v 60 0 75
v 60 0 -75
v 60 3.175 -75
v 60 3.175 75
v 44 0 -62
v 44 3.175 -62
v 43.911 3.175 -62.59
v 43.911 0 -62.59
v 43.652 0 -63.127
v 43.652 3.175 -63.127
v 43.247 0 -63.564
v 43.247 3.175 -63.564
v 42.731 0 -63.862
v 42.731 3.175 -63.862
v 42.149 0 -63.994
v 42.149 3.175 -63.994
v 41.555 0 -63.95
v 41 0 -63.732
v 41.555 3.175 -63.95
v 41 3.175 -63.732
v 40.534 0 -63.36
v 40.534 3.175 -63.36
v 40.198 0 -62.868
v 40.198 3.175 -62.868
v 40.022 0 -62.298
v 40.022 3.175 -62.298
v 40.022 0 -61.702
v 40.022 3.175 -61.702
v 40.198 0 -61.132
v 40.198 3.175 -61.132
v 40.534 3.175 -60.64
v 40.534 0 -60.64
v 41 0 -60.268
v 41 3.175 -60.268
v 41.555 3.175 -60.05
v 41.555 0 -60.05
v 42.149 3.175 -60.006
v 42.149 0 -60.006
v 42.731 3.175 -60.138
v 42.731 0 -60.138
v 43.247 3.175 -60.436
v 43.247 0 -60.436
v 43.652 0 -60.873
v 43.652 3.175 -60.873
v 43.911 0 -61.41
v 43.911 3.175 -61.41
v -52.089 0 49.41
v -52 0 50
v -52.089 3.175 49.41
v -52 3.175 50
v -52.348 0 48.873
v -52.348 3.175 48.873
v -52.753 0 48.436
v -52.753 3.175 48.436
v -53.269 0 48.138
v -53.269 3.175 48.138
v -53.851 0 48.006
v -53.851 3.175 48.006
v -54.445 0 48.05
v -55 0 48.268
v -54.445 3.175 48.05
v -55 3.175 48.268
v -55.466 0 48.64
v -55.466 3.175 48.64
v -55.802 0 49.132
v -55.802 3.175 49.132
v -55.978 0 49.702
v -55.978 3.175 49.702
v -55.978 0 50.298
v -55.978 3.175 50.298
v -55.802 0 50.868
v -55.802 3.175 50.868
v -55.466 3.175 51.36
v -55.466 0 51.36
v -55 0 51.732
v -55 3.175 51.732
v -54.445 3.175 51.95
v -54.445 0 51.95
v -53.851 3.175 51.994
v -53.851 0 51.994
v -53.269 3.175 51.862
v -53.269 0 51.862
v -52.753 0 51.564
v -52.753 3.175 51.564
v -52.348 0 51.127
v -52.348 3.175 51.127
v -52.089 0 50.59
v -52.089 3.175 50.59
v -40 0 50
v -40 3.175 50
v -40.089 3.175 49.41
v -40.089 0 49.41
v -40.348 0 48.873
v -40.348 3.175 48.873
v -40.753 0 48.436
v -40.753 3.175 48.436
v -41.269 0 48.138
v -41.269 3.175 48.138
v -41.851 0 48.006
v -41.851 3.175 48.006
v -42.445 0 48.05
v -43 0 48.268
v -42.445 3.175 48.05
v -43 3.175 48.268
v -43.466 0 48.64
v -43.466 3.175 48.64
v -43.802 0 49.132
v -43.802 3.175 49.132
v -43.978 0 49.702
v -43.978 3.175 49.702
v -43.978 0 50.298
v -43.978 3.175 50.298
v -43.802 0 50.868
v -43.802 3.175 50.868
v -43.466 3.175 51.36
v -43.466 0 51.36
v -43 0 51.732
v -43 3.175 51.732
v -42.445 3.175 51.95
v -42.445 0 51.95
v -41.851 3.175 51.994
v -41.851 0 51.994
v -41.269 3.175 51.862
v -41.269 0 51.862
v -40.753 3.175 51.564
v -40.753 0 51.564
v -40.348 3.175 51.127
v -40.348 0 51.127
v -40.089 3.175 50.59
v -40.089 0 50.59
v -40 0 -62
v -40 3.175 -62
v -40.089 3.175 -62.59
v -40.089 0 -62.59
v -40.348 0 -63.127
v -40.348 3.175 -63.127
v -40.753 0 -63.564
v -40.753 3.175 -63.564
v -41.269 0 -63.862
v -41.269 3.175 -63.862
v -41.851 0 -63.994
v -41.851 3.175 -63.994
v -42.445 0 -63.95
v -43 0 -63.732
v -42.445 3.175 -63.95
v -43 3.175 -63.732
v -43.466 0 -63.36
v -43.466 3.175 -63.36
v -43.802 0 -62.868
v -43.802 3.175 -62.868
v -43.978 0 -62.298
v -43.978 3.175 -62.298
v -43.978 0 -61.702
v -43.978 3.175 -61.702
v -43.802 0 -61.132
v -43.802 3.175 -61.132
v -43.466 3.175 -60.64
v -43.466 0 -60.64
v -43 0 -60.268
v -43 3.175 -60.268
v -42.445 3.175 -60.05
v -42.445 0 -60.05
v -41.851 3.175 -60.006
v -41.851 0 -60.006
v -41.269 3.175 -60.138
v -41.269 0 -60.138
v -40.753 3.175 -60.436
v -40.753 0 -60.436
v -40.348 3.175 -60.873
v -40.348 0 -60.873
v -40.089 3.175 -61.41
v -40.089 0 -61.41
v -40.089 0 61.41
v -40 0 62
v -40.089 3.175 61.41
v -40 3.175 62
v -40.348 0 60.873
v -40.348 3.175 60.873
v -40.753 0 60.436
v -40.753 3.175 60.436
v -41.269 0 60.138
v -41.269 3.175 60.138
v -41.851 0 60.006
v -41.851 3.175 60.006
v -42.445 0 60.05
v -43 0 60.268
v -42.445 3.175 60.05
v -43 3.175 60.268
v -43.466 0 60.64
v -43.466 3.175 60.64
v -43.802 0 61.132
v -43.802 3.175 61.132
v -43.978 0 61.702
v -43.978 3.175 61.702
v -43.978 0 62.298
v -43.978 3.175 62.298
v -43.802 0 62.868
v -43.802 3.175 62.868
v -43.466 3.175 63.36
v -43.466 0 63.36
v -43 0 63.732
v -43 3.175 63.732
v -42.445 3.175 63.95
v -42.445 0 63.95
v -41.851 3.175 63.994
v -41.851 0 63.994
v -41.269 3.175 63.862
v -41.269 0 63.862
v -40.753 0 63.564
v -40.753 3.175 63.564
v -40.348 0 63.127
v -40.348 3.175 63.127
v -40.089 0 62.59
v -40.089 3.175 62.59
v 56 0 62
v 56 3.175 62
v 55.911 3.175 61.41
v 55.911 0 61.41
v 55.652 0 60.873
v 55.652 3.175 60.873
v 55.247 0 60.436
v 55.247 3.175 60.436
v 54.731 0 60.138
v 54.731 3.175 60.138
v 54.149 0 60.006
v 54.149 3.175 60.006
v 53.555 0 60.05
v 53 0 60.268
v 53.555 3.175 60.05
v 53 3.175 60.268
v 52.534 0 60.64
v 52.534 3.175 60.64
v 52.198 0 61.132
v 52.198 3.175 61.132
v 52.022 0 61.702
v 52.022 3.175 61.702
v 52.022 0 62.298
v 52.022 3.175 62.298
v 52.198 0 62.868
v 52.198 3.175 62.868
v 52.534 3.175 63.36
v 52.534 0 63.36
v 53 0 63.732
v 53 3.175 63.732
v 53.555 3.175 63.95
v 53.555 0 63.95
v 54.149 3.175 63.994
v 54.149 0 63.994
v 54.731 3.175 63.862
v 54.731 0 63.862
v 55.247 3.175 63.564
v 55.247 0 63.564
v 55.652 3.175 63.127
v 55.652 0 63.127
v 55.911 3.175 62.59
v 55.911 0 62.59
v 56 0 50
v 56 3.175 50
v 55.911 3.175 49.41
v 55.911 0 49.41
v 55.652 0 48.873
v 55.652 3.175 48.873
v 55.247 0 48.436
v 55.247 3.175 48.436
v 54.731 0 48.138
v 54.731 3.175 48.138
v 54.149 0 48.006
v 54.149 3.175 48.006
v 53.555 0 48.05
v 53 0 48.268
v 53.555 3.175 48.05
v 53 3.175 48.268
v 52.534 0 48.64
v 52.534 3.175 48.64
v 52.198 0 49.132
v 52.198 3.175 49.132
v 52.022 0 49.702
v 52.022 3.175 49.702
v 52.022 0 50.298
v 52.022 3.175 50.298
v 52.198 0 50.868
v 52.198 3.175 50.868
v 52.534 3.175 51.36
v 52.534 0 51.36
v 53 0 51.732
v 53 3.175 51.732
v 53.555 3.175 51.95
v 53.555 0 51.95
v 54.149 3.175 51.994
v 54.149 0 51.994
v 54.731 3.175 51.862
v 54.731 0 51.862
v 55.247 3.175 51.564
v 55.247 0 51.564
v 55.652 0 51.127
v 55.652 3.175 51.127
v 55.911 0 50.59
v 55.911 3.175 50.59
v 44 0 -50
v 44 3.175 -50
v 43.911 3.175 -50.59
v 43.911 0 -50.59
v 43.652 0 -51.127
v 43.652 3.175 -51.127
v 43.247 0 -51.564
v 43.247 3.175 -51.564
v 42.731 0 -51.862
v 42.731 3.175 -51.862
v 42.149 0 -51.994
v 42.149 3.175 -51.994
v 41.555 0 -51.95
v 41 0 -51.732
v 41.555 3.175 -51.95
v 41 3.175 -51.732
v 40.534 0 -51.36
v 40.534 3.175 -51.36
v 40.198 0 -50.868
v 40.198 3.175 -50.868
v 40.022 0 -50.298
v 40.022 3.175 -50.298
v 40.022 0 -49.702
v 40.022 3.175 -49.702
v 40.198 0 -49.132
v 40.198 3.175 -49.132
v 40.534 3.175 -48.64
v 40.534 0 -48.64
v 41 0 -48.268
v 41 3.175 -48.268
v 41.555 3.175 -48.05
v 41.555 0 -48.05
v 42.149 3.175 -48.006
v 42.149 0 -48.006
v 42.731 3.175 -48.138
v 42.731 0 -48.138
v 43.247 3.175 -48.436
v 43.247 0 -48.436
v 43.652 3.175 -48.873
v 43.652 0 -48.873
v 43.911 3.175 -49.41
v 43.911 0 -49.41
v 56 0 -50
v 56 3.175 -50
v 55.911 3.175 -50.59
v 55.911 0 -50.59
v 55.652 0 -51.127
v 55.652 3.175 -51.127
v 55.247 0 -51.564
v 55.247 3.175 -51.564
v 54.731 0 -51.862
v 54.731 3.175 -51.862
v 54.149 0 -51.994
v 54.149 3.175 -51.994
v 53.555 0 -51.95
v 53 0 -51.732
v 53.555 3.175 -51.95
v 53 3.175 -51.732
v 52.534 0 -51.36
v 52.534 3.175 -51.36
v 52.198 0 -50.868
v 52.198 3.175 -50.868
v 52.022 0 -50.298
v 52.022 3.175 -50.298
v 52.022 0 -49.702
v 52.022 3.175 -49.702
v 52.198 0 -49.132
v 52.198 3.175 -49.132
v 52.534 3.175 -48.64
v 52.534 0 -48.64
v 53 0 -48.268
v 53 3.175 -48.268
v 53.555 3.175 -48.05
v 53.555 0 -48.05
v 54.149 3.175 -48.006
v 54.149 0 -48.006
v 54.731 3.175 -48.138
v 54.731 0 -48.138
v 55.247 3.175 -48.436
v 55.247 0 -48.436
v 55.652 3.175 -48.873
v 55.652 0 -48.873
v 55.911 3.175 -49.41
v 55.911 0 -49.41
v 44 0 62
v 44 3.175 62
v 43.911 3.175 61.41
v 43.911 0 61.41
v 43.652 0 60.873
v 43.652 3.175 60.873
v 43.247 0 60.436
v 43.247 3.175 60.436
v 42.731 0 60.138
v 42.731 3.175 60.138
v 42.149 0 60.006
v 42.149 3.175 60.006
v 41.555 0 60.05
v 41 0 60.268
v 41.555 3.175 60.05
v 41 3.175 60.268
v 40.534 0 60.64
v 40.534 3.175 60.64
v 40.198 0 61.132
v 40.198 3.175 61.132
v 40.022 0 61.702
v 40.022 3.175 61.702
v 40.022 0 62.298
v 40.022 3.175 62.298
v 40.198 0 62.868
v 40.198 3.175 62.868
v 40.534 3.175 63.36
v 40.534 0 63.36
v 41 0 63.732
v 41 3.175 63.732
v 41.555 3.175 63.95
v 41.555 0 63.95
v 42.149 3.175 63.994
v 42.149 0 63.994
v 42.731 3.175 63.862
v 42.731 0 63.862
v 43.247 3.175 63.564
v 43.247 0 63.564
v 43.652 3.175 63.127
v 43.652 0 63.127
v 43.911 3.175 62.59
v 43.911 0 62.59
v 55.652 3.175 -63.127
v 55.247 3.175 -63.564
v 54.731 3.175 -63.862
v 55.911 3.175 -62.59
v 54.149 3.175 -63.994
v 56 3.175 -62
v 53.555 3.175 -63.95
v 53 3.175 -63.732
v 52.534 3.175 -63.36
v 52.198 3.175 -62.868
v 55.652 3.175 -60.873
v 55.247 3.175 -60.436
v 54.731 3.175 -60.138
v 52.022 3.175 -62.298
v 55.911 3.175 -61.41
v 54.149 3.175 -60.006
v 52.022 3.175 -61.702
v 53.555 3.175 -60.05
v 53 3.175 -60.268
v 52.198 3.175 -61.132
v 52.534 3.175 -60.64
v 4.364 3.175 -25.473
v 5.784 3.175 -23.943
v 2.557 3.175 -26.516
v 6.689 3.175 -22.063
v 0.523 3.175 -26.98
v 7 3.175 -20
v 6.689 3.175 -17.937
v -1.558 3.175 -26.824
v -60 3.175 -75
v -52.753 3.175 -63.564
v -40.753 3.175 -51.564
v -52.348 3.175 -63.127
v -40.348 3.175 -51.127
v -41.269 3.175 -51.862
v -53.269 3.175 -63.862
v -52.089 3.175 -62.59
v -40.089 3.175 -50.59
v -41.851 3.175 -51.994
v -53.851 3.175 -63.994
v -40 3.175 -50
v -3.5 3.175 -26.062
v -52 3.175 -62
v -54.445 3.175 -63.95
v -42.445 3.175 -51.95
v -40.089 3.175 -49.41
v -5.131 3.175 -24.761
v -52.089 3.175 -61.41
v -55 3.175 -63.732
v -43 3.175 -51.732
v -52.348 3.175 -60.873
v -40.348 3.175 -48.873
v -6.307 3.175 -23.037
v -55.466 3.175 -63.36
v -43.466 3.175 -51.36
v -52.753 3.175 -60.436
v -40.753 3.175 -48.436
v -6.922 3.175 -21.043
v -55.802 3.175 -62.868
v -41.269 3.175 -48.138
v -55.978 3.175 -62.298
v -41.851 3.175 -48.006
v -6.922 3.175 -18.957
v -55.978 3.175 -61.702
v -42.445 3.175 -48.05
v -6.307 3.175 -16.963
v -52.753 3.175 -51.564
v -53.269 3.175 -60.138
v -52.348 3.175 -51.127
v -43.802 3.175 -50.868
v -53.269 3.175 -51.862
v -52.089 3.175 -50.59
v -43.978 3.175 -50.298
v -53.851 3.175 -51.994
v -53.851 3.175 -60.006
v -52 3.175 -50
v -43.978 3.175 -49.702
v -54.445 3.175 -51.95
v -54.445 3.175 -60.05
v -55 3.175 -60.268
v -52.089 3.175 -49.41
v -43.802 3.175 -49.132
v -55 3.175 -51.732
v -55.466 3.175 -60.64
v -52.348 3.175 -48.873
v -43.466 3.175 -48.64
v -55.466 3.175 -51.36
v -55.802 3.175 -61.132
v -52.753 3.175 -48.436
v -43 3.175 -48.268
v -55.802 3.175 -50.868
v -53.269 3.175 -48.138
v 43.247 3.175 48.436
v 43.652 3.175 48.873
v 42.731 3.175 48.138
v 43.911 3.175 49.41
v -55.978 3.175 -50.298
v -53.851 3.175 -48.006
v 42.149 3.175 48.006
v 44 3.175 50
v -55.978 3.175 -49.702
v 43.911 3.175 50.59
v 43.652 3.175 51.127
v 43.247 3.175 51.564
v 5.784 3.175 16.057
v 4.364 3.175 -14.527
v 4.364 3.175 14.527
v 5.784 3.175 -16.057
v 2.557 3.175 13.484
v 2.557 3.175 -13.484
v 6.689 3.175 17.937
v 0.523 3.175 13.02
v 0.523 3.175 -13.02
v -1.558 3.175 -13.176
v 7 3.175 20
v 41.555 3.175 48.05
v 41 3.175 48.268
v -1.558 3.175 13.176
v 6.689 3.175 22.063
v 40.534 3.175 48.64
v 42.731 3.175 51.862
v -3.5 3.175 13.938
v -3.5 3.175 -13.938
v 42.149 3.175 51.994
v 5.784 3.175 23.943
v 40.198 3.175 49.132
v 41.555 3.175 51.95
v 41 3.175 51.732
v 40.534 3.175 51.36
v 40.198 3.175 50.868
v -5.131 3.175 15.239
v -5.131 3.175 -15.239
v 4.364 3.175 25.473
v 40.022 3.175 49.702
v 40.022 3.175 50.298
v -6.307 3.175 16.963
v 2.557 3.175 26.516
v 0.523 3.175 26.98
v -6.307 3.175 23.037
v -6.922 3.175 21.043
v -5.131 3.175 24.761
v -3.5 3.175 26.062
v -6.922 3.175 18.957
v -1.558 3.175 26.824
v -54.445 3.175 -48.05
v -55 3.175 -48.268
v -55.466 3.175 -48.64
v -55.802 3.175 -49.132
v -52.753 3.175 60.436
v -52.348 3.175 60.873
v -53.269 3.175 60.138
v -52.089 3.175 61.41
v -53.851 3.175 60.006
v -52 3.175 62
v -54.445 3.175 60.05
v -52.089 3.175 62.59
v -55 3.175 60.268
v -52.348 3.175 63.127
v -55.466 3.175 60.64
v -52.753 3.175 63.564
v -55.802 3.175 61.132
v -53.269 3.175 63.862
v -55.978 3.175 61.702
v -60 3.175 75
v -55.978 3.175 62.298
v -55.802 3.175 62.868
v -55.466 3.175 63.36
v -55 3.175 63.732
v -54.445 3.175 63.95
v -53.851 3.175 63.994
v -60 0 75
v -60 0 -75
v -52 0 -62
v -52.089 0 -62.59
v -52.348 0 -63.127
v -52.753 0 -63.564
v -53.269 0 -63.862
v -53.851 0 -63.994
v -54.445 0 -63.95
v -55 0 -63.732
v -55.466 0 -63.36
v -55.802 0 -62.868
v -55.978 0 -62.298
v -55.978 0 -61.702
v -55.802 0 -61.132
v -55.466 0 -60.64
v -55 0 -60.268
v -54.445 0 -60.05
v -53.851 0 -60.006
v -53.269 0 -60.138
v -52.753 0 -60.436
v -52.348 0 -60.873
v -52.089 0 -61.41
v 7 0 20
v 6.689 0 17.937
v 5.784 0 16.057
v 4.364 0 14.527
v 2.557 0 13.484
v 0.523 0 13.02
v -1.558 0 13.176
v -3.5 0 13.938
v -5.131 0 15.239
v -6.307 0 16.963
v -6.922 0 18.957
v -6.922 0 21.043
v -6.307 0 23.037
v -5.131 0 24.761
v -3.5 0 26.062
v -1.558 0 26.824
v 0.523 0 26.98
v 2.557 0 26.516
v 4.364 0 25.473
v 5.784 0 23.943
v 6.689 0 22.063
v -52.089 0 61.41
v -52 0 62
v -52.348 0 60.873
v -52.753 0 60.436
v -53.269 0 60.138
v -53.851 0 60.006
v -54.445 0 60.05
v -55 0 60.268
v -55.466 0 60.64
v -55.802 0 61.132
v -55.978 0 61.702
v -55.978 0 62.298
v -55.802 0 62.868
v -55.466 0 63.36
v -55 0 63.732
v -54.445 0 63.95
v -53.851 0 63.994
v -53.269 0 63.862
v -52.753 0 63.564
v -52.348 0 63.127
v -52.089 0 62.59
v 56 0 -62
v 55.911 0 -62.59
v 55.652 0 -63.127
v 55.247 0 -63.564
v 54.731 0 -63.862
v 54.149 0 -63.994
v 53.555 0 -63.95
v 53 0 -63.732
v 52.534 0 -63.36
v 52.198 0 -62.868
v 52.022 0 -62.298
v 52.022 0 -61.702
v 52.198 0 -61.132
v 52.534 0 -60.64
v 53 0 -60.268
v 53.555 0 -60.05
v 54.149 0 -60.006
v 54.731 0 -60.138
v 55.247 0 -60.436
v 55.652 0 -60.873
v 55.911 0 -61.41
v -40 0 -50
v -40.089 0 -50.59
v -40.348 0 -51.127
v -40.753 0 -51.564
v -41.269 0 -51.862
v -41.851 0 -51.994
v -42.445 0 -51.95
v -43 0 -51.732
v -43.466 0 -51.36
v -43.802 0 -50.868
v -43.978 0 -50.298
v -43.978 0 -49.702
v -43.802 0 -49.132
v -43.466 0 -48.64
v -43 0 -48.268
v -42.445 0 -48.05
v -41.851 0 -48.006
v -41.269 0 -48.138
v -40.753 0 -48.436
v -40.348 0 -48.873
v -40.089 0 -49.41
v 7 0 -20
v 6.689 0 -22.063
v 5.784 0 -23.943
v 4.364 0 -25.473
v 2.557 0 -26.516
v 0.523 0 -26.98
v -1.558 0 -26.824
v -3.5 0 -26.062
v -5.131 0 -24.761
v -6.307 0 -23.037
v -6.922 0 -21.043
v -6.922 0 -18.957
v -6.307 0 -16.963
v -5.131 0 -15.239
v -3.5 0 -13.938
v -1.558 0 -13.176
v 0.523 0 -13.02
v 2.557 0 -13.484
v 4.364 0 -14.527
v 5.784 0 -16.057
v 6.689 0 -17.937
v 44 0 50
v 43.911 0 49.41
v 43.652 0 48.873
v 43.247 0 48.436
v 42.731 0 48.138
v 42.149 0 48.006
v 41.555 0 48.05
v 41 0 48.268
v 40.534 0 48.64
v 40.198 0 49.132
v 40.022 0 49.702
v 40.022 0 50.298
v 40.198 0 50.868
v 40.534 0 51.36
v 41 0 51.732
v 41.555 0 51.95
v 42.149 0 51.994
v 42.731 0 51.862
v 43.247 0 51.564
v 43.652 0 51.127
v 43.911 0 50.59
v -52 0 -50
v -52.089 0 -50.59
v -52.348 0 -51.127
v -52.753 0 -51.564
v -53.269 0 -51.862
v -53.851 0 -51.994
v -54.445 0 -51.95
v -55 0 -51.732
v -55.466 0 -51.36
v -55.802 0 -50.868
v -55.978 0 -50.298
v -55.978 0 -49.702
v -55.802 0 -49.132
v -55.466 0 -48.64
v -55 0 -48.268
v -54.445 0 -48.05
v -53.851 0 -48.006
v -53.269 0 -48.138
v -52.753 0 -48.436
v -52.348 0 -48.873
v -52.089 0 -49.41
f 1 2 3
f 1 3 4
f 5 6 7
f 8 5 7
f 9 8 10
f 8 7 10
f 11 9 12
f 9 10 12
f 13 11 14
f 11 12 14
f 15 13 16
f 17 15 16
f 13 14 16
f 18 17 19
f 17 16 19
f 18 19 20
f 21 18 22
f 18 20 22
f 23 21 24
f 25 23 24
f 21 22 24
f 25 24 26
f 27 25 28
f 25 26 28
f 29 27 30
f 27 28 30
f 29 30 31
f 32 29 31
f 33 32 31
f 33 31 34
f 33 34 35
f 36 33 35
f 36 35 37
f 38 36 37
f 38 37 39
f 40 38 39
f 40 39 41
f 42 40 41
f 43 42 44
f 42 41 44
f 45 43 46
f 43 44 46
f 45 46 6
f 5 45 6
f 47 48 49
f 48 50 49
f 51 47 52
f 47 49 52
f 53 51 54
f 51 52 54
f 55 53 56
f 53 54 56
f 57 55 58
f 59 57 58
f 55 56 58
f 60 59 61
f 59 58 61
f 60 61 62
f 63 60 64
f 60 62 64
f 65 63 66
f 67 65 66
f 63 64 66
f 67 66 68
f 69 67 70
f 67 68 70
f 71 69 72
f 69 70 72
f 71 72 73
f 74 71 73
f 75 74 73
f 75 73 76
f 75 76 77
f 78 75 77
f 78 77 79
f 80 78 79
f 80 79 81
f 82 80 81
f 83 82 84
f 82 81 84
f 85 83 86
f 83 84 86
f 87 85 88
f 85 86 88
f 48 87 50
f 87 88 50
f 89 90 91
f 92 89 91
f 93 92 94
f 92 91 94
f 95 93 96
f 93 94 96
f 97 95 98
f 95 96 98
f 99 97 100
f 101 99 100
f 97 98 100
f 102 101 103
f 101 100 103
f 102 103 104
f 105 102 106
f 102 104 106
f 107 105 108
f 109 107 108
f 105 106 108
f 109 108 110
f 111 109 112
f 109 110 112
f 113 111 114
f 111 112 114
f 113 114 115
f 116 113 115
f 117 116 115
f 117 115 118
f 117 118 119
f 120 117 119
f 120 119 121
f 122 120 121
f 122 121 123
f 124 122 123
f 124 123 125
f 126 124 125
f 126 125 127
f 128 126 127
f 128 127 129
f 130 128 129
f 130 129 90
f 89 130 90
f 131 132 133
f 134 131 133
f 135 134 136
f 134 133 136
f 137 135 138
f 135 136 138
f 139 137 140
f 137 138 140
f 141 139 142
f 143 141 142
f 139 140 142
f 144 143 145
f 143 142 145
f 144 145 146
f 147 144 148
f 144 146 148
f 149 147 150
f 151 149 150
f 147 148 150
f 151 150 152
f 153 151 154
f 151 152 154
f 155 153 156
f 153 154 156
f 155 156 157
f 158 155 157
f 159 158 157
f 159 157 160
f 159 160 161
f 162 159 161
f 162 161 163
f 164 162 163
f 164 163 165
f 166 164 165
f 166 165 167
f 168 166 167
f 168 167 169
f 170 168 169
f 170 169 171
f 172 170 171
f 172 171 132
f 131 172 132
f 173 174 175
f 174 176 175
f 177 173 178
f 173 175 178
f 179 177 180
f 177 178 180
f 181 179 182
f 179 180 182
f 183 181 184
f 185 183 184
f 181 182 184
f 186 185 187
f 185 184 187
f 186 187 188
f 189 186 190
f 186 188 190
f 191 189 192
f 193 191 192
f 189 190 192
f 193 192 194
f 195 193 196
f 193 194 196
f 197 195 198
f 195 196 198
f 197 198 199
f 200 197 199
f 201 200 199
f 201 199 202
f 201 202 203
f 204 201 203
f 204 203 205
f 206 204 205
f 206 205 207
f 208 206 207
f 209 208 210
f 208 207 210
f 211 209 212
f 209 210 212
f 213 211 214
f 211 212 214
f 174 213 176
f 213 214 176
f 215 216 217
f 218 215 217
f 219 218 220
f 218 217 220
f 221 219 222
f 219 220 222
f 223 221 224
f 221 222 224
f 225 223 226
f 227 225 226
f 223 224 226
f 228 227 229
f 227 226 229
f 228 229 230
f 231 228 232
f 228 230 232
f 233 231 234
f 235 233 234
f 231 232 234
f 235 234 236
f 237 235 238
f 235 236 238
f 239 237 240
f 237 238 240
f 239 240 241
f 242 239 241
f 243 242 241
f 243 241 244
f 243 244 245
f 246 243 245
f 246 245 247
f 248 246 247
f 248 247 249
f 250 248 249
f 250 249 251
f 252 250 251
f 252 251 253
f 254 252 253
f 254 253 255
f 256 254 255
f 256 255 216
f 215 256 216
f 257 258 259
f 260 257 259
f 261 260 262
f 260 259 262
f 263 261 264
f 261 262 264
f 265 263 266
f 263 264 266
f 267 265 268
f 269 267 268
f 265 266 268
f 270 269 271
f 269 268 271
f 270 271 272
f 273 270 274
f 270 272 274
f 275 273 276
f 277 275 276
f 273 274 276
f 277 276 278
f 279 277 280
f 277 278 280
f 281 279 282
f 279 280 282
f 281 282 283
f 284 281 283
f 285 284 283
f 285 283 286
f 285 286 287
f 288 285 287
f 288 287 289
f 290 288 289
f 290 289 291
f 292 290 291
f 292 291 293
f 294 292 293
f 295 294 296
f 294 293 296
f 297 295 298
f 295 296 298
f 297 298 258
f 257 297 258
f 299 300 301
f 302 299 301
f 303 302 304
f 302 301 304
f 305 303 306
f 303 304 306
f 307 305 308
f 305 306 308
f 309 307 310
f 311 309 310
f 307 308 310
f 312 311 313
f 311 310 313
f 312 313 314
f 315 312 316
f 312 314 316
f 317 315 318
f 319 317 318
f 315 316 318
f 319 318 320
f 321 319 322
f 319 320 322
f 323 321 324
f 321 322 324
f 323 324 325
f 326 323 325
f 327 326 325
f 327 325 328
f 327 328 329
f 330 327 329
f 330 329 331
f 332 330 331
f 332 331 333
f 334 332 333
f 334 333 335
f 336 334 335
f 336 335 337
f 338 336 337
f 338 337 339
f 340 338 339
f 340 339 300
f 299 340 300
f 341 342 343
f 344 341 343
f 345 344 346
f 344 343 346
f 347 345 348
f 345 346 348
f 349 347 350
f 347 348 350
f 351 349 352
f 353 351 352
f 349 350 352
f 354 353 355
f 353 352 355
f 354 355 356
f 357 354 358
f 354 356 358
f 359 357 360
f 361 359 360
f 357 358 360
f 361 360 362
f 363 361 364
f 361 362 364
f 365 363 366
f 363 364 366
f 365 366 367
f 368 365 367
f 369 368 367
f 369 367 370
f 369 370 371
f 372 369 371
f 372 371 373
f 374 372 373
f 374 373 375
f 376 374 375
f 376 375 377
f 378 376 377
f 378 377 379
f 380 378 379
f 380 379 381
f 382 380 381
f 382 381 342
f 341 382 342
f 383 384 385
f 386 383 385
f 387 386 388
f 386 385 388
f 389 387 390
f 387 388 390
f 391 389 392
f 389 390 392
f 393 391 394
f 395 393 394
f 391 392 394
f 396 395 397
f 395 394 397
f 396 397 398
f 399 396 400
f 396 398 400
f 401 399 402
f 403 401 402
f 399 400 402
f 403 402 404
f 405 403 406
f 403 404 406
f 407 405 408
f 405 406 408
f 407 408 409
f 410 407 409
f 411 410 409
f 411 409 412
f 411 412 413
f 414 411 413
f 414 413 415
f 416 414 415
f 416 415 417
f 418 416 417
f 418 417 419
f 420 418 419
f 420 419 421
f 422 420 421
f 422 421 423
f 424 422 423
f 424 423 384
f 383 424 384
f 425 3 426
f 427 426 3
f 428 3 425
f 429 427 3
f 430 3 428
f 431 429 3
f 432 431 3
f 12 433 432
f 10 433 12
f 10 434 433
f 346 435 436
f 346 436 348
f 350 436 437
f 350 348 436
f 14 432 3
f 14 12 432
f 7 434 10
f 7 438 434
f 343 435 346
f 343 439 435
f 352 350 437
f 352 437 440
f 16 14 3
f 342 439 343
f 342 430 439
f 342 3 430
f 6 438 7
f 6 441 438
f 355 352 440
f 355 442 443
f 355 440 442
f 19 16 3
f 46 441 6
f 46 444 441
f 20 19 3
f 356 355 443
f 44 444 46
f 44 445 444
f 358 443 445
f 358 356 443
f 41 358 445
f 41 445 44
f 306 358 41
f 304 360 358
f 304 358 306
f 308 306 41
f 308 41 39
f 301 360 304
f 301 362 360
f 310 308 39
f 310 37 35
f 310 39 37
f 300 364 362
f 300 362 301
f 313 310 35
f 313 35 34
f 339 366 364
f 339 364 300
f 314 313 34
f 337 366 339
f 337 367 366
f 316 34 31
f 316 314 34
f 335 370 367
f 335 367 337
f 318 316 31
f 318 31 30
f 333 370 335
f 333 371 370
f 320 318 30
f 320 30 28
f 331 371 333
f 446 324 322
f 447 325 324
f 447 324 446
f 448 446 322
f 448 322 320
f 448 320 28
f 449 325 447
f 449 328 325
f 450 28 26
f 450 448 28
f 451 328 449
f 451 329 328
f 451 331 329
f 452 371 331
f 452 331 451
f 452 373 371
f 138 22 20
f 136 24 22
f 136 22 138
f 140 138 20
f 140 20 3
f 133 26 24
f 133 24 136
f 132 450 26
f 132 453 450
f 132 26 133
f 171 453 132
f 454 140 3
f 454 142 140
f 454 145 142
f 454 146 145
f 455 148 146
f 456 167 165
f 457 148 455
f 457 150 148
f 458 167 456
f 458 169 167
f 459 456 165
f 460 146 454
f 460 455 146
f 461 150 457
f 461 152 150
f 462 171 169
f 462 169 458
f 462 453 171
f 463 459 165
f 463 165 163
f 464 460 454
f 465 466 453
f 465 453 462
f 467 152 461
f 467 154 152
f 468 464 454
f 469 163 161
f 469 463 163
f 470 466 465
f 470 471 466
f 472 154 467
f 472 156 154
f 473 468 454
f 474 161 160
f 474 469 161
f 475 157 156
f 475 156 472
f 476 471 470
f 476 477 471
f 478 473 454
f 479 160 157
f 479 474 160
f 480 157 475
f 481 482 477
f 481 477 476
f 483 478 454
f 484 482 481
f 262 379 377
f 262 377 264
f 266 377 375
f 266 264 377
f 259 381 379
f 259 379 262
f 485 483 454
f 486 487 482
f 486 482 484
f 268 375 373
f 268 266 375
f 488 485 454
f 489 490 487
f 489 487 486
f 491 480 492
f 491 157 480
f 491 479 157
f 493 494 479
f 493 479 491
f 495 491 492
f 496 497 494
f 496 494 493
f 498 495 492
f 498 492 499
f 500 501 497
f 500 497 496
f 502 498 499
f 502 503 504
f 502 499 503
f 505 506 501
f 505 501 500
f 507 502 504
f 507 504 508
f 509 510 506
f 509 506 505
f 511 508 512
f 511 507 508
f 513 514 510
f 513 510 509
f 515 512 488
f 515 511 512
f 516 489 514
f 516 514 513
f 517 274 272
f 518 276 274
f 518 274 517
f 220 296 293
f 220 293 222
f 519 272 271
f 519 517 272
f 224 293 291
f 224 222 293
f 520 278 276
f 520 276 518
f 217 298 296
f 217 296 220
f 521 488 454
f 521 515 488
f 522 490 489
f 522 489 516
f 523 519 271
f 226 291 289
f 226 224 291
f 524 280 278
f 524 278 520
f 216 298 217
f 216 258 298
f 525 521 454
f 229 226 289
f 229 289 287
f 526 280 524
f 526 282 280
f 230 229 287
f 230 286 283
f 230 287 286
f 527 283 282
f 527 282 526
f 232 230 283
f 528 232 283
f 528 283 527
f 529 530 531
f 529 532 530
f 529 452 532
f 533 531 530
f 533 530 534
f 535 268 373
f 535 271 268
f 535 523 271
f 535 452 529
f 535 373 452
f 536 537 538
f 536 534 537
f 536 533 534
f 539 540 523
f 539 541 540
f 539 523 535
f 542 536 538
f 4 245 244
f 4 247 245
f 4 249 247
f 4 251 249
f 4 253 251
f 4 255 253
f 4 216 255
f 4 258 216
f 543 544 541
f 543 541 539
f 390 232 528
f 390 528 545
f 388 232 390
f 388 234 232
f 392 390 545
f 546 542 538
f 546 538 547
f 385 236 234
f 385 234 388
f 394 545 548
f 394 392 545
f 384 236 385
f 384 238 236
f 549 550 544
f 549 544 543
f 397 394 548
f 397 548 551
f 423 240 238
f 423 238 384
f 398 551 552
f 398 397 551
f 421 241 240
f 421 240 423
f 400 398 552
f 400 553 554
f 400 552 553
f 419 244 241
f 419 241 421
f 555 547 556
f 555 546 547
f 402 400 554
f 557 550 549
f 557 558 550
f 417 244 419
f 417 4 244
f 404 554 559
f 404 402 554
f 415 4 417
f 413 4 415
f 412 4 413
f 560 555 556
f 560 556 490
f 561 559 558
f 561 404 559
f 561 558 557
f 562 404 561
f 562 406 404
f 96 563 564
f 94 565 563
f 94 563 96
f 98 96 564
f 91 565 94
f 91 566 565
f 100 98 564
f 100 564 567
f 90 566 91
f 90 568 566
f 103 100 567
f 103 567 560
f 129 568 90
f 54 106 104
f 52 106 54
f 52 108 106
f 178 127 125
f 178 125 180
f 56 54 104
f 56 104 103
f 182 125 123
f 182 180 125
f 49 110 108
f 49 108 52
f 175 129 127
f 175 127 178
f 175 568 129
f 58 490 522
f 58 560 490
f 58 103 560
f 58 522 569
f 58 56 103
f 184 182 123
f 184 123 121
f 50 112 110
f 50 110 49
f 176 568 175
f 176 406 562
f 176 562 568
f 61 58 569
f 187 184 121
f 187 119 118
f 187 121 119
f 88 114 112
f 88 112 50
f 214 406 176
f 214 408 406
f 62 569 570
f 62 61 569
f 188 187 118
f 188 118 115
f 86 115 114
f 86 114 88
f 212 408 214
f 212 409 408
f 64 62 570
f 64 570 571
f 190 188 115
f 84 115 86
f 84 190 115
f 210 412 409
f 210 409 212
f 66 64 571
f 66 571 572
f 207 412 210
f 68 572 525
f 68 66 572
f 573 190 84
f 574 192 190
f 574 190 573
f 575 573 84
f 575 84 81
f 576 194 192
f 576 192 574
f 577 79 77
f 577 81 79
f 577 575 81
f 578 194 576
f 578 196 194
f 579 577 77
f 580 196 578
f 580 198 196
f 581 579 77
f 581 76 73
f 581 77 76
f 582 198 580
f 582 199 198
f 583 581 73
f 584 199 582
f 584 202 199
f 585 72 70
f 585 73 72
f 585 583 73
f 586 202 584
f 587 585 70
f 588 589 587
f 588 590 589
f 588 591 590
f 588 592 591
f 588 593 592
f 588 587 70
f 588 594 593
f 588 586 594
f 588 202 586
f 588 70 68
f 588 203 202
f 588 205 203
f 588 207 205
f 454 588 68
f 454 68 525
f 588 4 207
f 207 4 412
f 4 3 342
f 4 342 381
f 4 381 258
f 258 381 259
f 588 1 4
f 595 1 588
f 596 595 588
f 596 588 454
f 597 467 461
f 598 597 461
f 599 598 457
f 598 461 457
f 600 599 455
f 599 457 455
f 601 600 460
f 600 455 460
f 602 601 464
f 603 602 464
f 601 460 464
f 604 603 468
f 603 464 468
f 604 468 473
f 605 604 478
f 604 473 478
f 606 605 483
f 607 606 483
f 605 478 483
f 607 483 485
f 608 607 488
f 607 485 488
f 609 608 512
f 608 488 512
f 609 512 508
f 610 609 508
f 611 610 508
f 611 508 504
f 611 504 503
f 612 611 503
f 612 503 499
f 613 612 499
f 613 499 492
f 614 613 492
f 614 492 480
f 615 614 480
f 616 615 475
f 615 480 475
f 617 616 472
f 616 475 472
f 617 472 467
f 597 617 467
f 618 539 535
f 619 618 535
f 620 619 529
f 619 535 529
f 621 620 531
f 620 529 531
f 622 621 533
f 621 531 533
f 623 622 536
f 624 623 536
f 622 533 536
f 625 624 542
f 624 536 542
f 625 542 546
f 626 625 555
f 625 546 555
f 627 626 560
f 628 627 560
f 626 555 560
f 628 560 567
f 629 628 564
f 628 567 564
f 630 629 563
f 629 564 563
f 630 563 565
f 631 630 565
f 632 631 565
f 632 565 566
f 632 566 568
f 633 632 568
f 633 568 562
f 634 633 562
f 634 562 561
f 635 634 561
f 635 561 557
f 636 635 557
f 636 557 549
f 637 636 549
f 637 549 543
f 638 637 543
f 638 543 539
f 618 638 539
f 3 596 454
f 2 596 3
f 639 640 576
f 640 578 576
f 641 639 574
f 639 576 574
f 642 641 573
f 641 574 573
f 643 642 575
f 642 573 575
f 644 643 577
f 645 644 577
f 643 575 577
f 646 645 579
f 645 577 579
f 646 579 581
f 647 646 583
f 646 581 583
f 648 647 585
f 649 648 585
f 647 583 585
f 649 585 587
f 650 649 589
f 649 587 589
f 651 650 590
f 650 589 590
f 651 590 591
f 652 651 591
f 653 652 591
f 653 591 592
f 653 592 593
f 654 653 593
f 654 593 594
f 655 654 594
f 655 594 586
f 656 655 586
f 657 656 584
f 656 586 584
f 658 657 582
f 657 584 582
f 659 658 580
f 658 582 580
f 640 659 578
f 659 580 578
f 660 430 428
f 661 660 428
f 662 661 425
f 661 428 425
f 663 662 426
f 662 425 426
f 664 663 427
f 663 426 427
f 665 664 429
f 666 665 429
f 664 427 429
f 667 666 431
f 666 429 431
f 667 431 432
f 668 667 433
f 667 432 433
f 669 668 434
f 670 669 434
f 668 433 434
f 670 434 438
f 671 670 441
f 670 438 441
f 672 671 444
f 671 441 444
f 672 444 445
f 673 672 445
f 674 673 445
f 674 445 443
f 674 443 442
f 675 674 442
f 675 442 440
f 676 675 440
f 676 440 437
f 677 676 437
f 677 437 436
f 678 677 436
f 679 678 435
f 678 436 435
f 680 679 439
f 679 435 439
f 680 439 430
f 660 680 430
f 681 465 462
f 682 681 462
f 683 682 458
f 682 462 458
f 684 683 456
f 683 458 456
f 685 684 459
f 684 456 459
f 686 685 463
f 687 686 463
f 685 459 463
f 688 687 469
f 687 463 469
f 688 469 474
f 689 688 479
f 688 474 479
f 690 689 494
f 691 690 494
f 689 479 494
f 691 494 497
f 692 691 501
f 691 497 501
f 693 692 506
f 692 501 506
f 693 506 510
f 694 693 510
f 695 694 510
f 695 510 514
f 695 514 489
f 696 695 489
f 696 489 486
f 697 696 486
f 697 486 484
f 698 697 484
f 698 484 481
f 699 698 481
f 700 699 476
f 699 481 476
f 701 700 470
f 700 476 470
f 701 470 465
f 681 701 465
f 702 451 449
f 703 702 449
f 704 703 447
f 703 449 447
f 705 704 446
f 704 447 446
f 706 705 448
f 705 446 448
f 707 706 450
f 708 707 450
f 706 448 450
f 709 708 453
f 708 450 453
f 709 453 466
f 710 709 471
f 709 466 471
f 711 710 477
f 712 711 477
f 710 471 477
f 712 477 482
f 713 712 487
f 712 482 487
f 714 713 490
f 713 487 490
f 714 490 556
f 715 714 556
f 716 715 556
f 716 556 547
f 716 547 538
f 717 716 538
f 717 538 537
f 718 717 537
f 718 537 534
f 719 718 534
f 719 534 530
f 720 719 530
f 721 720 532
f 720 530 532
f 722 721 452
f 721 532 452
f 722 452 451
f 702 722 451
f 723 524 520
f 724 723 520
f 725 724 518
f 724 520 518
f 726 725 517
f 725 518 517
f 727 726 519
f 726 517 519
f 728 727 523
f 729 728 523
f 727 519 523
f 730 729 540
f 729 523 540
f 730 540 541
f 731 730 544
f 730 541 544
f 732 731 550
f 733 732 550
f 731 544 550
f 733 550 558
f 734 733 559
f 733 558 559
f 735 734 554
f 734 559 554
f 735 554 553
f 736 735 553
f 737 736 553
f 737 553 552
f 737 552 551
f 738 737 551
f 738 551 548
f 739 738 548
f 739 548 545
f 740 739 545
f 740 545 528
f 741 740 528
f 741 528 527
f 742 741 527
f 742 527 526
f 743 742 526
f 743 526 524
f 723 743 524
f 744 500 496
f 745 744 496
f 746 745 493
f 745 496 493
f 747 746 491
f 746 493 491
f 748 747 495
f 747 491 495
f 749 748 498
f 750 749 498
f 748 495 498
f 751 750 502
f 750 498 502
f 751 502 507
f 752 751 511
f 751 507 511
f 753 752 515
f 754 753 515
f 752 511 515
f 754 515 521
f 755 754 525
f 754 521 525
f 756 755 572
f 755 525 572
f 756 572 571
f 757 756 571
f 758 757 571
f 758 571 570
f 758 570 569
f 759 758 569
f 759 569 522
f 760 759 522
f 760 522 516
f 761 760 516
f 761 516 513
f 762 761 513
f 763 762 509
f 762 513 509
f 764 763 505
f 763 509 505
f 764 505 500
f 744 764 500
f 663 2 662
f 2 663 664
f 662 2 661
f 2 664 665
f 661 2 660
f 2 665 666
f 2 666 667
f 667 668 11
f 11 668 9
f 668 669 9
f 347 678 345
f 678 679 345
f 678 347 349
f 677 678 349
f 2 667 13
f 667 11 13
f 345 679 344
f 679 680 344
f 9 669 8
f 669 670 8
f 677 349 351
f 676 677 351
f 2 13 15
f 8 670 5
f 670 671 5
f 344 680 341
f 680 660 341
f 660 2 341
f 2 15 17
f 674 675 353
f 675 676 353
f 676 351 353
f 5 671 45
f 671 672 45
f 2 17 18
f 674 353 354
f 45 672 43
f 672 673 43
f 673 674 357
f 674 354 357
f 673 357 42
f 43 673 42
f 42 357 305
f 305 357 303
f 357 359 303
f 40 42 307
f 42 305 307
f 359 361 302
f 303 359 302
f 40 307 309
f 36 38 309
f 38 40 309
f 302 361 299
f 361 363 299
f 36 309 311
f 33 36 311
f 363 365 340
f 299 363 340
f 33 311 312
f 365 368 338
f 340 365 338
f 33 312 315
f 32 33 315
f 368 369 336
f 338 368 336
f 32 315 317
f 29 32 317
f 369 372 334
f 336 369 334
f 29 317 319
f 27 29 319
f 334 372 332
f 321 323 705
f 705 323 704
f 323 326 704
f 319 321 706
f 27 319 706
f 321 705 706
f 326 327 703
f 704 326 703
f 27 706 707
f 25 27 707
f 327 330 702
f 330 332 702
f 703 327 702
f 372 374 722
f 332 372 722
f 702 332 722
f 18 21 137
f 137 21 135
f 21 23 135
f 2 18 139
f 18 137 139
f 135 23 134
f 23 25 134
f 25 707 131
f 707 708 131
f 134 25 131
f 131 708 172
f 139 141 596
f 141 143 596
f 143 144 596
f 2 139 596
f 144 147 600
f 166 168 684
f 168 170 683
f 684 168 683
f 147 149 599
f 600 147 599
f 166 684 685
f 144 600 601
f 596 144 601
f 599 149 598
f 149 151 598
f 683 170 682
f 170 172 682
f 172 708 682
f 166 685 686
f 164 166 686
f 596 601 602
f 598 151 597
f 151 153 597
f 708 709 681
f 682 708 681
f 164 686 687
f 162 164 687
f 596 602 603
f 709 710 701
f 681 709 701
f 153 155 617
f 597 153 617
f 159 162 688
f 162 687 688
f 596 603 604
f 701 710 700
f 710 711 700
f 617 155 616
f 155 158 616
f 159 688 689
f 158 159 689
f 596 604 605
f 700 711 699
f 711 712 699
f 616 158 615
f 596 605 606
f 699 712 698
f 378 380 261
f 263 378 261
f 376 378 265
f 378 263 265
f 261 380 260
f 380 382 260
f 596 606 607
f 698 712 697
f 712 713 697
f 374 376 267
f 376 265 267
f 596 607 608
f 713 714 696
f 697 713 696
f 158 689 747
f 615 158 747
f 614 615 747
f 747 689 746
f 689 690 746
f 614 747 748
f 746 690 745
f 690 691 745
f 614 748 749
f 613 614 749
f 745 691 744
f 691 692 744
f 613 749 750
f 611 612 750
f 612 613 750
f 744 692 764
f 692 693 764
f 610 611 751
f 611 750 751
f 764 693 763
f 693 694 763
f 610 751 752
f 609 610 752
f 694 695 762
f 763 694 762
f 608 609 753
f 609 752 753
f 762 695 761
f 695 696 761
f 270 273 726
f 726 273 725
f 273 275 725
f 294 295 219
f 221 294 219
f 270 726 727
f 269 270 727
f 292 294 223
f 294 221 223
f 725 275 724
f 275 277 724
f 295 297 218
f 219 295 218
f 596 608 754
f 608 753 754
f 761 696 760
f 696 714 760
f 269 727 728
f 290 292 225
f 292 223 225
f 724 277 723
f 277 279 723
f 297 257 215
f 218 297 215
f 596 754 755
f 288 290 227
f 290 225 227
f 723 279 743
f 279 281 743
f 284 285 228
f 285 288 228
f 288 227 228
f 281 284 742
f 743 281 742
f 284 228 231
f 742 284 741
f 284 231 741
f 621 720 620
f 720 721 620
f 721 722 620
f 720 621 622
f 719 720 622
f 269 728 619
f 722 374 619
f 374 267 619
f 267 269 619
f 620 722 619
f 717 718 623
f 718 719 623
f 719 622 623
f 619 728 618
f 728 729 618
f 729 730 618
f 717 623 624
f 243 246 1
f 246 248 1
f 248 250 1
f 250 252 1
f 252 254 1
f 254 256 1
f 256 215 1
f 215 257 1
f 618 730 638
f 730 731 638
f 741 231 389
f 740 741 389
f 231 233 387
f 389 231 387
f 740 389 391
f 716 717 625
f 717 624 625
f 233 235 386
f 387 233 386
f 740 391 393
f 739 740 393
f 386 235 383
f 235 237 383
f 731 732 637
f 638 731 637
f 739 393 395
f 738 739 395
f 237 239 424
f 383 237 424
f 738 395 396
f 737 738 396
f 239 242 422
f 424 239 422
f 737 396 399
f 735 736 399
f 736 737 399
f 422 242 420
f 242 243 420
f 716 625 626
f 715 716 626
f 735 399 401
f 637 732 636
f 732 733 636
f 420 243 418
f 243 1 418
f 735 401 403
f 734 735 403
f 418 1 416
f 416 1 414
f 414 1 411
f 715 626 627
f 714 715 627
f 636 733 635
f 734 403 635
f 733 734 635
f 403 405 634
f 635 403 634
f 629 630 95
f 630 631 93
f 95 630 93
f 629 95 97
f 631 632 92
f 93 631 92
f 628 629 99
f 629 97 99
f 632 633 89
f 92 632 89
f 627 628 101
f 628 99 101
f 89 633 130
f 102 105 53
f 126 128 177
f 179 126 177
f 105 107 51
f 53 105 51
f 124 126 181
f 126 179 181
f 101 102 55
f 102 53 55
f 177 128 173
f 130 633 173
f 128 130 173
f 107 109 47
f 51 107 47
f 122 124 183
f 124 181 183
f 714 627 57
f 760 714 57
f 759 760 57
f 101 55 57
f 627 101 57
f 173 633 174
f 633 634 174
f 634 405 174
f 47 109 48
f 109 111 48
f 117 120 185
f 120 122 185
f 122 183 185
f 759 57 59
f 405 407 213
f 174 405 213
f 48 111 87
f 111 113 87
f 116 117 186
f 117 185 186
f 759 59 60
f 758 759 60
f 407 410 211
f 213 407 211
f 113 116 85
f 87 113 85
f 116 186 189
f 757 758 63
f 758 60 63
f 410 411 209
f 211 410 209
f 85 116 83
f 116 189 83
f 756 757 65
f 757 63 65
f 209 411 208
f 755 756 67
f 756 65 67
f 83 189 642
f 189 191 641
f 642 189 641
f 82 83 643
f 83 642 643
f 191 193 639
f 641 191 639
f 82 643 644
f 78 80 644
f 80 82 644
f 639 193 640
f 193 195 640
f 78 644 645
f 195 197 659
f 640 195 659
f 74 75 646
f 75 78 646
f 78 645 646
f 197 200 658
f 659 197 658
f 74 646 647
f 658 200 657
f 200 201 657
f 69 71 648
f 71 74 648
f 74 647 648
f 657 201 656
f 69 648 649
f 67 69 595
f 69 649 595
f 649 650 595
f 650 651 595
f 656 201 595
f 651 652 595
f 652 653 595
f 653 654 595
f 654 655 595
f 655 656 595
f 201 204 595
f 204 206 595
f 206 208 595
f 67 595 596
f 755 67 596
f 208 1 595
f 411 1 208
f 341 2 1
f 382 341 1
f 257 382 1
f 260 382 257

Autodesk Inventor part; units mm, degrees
ref_plane "YZ Plane" through (0, 0, 0) normal (1, 0, 0) x (0, 1, 0)
ref_plane "XZ Plane" through (0, 0, 0) normal (0, 1, 0) x (-1, 0, 0)
ref_plane "XY Plane" through (0, 0, 0) normal (0, 0, 1) x (1, 0, 0)
sketch "Sketch1" plane through (0, 0, 0) normal (0, 1, 0) x (-1, 0, 0)
  line L0 (-60, 75) -> (60, 75)
  line L1 (60, 75) -> (60, -75)
  line L2 (60, -75) -> (-60, -75)
  line L3 (-60, -75) -> (-60, 75)
  line L4 (-60, 75) -> (60, -75) construction
  line L5 (60, 75) -> (-60, -75) construction
  point P0 (0, 0)
  dimension "d0" = 120
  dimension "d1" = 150
extrude "Extrusion1" add sketch "Sketch1" along normal blind 3.175
sketch "Sketch2" plane through (0, 3.175, 0) normal (0, 1, 0) x (1, 0, 0)
  circle A0 centre (-48, -56) radius 2.5 construction
  circle A1 centre (-54, -62) radius 2
  circle A2 centre (-42, -62) radius 2
  circle A3 centre (-42, -50) radius 2
  circle A4 centre (-54, -50) radius 2
  line L0 (-60, 75) -> (-60, -75) construction
  line L1 (-60, 0) -> (60, 0) construction
  line L2 (60, -75) -> (60, 75) construction
  line L3 (-60, -75) -> (60, -75) construction
  line L4 (0, -75) -> (0, 72.2302) construction
  circle A5 centre (-54, 62) radius 2
  circle A6 centre (-42, 62) radius 2
  circle A7 centre (-42, 50) radius 2
  circle A8 centre (-54, 50) radius 2
  circle A9 centre (54, -62) radius 2
  circle A10 centre (42, -62) radius 2
  circle A11 centre (42, -50) radius 2
  circle A12 centre (54, -50) radius 2
  circle A13 centre (42, 50) radius 2
  circle A14 centre (54, 50) radius 2
  circle A15 centre (42, 62) radius 2
  circle A16 centre (54, 62) radius 2
  circle A17 centre (0, 0) radius 7 construction
  circle A18 centre (0, 20) radius 7
  circle A19 centre (0, -20) radius 7
  point P0 (0, 0)
  dimension "d4" = 5
  dimension "d5" = 56
  dimension "d6" = 48
  dimension "d7" = 4
  dimension "d8" = 6
  dimension "d9" = 6
  dimension "d12" = 360
  dimension "d14" = 14
  dimension "d17" = 14
  dimension "d20" = 20
  dimension "d21" = 14
  dimension "d22" = 20
extrude "Extrusion2" cut sketch "Sketch2" against normal through all
properties part number "TurretMotorCase_TopPlate"
